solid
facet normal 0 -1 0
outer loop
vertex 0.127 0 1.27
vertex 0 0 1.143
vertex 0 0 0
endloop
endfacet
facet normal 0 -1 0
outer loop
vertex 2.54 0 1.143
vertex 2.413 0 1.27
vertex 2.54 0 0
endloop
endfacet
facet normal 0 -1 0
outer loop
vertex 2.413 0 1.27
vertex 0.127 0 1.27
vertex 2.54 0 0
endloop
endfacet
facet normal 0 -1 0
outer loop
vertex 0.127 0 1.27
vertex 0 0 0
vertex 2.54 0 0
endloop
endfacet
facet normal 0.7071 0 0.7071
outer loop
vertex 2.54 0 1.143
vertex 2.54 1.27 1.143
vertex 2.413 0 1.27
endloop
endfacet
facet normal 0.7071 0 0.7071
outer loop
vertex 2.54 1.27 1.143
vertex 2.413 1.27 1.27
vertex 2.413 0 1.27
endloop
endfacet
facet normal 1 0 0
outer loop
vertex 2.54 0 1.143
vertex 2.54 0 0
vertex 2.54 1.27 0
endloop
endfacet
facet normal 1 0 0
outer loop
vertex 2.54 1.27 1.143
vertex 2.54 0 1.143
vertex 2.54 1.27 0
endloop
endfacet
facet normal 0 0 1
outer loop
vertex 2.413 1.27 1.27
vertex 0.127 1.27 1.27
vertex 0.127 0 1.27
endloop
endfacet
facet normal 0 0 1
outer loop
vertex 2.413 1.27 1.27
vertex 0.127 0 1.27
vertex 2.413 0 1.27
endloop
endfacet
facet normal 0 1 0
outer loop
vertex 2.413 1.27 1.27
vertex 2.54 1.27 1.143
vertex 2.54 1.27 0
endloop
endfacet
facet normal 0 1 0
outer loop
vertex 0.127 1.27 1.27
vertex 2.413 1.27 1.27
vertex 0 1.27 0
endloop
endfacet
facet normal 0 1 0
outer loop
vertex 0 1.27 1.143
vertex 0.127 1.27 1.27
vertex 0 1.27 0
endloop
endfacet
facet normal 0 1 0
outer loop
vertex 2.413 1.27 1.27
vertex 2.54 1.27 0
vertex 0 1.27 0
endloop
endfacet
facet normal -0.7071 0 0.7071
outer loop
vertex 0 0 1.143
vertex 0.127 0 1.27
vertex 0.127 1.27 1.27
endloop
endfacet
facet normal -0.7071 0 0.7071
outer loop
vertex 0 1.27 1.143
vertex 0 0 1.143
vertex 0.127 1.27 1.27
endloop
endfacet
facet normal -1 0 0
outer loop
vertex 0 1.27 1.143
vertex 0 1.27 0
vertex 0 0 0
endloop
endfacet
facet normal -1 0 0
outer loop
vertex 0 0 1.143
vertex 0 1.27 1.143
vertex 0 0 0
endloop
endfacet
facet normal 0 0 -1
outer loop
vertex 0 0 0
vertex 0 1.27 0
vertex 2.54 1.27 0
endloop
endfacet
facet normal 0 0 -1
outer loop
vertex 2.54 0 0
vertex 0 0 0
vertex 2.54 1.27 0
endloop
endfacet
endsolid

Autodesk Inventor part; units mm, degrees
ref_plane "YZ Plane" through (0, 0, 0) normal (1, 0, 0) x (0, 1, 0)
ref_plane "XZ Plane" through (0, 0, 0) normal (0, 1, 0) x (-1, 0, 0)
ref_plane "XY Plane" through (0, 0, 0) normal (0, 0, 1) x (1, 0, 0)
sketch "Sketch1" plane through (0, 0, 0) normal (0, 0, 1) x (1, 0, 0)
  line L0 (0, 0) -> (2.54, 0)
  line L1 (2.54, 0) -> (2.54, 1.27)
  line L2 (2.54, 1.27) -> (0, 1.27)
  line L3 (0, 1.27) -> (0, 0)
  dimension "d0" = 2.54
  dimension "d1" = 1.27
extrude "Extrusion1" add sketch "Sketch1" along normal blind 1.27
chamfer "Chamfer1" distance 0.127 angle 45 2 edges at (0, 0.635, 1.27) (2.54, 0.635, 1.27)
properties material "Phenolic Resin"
